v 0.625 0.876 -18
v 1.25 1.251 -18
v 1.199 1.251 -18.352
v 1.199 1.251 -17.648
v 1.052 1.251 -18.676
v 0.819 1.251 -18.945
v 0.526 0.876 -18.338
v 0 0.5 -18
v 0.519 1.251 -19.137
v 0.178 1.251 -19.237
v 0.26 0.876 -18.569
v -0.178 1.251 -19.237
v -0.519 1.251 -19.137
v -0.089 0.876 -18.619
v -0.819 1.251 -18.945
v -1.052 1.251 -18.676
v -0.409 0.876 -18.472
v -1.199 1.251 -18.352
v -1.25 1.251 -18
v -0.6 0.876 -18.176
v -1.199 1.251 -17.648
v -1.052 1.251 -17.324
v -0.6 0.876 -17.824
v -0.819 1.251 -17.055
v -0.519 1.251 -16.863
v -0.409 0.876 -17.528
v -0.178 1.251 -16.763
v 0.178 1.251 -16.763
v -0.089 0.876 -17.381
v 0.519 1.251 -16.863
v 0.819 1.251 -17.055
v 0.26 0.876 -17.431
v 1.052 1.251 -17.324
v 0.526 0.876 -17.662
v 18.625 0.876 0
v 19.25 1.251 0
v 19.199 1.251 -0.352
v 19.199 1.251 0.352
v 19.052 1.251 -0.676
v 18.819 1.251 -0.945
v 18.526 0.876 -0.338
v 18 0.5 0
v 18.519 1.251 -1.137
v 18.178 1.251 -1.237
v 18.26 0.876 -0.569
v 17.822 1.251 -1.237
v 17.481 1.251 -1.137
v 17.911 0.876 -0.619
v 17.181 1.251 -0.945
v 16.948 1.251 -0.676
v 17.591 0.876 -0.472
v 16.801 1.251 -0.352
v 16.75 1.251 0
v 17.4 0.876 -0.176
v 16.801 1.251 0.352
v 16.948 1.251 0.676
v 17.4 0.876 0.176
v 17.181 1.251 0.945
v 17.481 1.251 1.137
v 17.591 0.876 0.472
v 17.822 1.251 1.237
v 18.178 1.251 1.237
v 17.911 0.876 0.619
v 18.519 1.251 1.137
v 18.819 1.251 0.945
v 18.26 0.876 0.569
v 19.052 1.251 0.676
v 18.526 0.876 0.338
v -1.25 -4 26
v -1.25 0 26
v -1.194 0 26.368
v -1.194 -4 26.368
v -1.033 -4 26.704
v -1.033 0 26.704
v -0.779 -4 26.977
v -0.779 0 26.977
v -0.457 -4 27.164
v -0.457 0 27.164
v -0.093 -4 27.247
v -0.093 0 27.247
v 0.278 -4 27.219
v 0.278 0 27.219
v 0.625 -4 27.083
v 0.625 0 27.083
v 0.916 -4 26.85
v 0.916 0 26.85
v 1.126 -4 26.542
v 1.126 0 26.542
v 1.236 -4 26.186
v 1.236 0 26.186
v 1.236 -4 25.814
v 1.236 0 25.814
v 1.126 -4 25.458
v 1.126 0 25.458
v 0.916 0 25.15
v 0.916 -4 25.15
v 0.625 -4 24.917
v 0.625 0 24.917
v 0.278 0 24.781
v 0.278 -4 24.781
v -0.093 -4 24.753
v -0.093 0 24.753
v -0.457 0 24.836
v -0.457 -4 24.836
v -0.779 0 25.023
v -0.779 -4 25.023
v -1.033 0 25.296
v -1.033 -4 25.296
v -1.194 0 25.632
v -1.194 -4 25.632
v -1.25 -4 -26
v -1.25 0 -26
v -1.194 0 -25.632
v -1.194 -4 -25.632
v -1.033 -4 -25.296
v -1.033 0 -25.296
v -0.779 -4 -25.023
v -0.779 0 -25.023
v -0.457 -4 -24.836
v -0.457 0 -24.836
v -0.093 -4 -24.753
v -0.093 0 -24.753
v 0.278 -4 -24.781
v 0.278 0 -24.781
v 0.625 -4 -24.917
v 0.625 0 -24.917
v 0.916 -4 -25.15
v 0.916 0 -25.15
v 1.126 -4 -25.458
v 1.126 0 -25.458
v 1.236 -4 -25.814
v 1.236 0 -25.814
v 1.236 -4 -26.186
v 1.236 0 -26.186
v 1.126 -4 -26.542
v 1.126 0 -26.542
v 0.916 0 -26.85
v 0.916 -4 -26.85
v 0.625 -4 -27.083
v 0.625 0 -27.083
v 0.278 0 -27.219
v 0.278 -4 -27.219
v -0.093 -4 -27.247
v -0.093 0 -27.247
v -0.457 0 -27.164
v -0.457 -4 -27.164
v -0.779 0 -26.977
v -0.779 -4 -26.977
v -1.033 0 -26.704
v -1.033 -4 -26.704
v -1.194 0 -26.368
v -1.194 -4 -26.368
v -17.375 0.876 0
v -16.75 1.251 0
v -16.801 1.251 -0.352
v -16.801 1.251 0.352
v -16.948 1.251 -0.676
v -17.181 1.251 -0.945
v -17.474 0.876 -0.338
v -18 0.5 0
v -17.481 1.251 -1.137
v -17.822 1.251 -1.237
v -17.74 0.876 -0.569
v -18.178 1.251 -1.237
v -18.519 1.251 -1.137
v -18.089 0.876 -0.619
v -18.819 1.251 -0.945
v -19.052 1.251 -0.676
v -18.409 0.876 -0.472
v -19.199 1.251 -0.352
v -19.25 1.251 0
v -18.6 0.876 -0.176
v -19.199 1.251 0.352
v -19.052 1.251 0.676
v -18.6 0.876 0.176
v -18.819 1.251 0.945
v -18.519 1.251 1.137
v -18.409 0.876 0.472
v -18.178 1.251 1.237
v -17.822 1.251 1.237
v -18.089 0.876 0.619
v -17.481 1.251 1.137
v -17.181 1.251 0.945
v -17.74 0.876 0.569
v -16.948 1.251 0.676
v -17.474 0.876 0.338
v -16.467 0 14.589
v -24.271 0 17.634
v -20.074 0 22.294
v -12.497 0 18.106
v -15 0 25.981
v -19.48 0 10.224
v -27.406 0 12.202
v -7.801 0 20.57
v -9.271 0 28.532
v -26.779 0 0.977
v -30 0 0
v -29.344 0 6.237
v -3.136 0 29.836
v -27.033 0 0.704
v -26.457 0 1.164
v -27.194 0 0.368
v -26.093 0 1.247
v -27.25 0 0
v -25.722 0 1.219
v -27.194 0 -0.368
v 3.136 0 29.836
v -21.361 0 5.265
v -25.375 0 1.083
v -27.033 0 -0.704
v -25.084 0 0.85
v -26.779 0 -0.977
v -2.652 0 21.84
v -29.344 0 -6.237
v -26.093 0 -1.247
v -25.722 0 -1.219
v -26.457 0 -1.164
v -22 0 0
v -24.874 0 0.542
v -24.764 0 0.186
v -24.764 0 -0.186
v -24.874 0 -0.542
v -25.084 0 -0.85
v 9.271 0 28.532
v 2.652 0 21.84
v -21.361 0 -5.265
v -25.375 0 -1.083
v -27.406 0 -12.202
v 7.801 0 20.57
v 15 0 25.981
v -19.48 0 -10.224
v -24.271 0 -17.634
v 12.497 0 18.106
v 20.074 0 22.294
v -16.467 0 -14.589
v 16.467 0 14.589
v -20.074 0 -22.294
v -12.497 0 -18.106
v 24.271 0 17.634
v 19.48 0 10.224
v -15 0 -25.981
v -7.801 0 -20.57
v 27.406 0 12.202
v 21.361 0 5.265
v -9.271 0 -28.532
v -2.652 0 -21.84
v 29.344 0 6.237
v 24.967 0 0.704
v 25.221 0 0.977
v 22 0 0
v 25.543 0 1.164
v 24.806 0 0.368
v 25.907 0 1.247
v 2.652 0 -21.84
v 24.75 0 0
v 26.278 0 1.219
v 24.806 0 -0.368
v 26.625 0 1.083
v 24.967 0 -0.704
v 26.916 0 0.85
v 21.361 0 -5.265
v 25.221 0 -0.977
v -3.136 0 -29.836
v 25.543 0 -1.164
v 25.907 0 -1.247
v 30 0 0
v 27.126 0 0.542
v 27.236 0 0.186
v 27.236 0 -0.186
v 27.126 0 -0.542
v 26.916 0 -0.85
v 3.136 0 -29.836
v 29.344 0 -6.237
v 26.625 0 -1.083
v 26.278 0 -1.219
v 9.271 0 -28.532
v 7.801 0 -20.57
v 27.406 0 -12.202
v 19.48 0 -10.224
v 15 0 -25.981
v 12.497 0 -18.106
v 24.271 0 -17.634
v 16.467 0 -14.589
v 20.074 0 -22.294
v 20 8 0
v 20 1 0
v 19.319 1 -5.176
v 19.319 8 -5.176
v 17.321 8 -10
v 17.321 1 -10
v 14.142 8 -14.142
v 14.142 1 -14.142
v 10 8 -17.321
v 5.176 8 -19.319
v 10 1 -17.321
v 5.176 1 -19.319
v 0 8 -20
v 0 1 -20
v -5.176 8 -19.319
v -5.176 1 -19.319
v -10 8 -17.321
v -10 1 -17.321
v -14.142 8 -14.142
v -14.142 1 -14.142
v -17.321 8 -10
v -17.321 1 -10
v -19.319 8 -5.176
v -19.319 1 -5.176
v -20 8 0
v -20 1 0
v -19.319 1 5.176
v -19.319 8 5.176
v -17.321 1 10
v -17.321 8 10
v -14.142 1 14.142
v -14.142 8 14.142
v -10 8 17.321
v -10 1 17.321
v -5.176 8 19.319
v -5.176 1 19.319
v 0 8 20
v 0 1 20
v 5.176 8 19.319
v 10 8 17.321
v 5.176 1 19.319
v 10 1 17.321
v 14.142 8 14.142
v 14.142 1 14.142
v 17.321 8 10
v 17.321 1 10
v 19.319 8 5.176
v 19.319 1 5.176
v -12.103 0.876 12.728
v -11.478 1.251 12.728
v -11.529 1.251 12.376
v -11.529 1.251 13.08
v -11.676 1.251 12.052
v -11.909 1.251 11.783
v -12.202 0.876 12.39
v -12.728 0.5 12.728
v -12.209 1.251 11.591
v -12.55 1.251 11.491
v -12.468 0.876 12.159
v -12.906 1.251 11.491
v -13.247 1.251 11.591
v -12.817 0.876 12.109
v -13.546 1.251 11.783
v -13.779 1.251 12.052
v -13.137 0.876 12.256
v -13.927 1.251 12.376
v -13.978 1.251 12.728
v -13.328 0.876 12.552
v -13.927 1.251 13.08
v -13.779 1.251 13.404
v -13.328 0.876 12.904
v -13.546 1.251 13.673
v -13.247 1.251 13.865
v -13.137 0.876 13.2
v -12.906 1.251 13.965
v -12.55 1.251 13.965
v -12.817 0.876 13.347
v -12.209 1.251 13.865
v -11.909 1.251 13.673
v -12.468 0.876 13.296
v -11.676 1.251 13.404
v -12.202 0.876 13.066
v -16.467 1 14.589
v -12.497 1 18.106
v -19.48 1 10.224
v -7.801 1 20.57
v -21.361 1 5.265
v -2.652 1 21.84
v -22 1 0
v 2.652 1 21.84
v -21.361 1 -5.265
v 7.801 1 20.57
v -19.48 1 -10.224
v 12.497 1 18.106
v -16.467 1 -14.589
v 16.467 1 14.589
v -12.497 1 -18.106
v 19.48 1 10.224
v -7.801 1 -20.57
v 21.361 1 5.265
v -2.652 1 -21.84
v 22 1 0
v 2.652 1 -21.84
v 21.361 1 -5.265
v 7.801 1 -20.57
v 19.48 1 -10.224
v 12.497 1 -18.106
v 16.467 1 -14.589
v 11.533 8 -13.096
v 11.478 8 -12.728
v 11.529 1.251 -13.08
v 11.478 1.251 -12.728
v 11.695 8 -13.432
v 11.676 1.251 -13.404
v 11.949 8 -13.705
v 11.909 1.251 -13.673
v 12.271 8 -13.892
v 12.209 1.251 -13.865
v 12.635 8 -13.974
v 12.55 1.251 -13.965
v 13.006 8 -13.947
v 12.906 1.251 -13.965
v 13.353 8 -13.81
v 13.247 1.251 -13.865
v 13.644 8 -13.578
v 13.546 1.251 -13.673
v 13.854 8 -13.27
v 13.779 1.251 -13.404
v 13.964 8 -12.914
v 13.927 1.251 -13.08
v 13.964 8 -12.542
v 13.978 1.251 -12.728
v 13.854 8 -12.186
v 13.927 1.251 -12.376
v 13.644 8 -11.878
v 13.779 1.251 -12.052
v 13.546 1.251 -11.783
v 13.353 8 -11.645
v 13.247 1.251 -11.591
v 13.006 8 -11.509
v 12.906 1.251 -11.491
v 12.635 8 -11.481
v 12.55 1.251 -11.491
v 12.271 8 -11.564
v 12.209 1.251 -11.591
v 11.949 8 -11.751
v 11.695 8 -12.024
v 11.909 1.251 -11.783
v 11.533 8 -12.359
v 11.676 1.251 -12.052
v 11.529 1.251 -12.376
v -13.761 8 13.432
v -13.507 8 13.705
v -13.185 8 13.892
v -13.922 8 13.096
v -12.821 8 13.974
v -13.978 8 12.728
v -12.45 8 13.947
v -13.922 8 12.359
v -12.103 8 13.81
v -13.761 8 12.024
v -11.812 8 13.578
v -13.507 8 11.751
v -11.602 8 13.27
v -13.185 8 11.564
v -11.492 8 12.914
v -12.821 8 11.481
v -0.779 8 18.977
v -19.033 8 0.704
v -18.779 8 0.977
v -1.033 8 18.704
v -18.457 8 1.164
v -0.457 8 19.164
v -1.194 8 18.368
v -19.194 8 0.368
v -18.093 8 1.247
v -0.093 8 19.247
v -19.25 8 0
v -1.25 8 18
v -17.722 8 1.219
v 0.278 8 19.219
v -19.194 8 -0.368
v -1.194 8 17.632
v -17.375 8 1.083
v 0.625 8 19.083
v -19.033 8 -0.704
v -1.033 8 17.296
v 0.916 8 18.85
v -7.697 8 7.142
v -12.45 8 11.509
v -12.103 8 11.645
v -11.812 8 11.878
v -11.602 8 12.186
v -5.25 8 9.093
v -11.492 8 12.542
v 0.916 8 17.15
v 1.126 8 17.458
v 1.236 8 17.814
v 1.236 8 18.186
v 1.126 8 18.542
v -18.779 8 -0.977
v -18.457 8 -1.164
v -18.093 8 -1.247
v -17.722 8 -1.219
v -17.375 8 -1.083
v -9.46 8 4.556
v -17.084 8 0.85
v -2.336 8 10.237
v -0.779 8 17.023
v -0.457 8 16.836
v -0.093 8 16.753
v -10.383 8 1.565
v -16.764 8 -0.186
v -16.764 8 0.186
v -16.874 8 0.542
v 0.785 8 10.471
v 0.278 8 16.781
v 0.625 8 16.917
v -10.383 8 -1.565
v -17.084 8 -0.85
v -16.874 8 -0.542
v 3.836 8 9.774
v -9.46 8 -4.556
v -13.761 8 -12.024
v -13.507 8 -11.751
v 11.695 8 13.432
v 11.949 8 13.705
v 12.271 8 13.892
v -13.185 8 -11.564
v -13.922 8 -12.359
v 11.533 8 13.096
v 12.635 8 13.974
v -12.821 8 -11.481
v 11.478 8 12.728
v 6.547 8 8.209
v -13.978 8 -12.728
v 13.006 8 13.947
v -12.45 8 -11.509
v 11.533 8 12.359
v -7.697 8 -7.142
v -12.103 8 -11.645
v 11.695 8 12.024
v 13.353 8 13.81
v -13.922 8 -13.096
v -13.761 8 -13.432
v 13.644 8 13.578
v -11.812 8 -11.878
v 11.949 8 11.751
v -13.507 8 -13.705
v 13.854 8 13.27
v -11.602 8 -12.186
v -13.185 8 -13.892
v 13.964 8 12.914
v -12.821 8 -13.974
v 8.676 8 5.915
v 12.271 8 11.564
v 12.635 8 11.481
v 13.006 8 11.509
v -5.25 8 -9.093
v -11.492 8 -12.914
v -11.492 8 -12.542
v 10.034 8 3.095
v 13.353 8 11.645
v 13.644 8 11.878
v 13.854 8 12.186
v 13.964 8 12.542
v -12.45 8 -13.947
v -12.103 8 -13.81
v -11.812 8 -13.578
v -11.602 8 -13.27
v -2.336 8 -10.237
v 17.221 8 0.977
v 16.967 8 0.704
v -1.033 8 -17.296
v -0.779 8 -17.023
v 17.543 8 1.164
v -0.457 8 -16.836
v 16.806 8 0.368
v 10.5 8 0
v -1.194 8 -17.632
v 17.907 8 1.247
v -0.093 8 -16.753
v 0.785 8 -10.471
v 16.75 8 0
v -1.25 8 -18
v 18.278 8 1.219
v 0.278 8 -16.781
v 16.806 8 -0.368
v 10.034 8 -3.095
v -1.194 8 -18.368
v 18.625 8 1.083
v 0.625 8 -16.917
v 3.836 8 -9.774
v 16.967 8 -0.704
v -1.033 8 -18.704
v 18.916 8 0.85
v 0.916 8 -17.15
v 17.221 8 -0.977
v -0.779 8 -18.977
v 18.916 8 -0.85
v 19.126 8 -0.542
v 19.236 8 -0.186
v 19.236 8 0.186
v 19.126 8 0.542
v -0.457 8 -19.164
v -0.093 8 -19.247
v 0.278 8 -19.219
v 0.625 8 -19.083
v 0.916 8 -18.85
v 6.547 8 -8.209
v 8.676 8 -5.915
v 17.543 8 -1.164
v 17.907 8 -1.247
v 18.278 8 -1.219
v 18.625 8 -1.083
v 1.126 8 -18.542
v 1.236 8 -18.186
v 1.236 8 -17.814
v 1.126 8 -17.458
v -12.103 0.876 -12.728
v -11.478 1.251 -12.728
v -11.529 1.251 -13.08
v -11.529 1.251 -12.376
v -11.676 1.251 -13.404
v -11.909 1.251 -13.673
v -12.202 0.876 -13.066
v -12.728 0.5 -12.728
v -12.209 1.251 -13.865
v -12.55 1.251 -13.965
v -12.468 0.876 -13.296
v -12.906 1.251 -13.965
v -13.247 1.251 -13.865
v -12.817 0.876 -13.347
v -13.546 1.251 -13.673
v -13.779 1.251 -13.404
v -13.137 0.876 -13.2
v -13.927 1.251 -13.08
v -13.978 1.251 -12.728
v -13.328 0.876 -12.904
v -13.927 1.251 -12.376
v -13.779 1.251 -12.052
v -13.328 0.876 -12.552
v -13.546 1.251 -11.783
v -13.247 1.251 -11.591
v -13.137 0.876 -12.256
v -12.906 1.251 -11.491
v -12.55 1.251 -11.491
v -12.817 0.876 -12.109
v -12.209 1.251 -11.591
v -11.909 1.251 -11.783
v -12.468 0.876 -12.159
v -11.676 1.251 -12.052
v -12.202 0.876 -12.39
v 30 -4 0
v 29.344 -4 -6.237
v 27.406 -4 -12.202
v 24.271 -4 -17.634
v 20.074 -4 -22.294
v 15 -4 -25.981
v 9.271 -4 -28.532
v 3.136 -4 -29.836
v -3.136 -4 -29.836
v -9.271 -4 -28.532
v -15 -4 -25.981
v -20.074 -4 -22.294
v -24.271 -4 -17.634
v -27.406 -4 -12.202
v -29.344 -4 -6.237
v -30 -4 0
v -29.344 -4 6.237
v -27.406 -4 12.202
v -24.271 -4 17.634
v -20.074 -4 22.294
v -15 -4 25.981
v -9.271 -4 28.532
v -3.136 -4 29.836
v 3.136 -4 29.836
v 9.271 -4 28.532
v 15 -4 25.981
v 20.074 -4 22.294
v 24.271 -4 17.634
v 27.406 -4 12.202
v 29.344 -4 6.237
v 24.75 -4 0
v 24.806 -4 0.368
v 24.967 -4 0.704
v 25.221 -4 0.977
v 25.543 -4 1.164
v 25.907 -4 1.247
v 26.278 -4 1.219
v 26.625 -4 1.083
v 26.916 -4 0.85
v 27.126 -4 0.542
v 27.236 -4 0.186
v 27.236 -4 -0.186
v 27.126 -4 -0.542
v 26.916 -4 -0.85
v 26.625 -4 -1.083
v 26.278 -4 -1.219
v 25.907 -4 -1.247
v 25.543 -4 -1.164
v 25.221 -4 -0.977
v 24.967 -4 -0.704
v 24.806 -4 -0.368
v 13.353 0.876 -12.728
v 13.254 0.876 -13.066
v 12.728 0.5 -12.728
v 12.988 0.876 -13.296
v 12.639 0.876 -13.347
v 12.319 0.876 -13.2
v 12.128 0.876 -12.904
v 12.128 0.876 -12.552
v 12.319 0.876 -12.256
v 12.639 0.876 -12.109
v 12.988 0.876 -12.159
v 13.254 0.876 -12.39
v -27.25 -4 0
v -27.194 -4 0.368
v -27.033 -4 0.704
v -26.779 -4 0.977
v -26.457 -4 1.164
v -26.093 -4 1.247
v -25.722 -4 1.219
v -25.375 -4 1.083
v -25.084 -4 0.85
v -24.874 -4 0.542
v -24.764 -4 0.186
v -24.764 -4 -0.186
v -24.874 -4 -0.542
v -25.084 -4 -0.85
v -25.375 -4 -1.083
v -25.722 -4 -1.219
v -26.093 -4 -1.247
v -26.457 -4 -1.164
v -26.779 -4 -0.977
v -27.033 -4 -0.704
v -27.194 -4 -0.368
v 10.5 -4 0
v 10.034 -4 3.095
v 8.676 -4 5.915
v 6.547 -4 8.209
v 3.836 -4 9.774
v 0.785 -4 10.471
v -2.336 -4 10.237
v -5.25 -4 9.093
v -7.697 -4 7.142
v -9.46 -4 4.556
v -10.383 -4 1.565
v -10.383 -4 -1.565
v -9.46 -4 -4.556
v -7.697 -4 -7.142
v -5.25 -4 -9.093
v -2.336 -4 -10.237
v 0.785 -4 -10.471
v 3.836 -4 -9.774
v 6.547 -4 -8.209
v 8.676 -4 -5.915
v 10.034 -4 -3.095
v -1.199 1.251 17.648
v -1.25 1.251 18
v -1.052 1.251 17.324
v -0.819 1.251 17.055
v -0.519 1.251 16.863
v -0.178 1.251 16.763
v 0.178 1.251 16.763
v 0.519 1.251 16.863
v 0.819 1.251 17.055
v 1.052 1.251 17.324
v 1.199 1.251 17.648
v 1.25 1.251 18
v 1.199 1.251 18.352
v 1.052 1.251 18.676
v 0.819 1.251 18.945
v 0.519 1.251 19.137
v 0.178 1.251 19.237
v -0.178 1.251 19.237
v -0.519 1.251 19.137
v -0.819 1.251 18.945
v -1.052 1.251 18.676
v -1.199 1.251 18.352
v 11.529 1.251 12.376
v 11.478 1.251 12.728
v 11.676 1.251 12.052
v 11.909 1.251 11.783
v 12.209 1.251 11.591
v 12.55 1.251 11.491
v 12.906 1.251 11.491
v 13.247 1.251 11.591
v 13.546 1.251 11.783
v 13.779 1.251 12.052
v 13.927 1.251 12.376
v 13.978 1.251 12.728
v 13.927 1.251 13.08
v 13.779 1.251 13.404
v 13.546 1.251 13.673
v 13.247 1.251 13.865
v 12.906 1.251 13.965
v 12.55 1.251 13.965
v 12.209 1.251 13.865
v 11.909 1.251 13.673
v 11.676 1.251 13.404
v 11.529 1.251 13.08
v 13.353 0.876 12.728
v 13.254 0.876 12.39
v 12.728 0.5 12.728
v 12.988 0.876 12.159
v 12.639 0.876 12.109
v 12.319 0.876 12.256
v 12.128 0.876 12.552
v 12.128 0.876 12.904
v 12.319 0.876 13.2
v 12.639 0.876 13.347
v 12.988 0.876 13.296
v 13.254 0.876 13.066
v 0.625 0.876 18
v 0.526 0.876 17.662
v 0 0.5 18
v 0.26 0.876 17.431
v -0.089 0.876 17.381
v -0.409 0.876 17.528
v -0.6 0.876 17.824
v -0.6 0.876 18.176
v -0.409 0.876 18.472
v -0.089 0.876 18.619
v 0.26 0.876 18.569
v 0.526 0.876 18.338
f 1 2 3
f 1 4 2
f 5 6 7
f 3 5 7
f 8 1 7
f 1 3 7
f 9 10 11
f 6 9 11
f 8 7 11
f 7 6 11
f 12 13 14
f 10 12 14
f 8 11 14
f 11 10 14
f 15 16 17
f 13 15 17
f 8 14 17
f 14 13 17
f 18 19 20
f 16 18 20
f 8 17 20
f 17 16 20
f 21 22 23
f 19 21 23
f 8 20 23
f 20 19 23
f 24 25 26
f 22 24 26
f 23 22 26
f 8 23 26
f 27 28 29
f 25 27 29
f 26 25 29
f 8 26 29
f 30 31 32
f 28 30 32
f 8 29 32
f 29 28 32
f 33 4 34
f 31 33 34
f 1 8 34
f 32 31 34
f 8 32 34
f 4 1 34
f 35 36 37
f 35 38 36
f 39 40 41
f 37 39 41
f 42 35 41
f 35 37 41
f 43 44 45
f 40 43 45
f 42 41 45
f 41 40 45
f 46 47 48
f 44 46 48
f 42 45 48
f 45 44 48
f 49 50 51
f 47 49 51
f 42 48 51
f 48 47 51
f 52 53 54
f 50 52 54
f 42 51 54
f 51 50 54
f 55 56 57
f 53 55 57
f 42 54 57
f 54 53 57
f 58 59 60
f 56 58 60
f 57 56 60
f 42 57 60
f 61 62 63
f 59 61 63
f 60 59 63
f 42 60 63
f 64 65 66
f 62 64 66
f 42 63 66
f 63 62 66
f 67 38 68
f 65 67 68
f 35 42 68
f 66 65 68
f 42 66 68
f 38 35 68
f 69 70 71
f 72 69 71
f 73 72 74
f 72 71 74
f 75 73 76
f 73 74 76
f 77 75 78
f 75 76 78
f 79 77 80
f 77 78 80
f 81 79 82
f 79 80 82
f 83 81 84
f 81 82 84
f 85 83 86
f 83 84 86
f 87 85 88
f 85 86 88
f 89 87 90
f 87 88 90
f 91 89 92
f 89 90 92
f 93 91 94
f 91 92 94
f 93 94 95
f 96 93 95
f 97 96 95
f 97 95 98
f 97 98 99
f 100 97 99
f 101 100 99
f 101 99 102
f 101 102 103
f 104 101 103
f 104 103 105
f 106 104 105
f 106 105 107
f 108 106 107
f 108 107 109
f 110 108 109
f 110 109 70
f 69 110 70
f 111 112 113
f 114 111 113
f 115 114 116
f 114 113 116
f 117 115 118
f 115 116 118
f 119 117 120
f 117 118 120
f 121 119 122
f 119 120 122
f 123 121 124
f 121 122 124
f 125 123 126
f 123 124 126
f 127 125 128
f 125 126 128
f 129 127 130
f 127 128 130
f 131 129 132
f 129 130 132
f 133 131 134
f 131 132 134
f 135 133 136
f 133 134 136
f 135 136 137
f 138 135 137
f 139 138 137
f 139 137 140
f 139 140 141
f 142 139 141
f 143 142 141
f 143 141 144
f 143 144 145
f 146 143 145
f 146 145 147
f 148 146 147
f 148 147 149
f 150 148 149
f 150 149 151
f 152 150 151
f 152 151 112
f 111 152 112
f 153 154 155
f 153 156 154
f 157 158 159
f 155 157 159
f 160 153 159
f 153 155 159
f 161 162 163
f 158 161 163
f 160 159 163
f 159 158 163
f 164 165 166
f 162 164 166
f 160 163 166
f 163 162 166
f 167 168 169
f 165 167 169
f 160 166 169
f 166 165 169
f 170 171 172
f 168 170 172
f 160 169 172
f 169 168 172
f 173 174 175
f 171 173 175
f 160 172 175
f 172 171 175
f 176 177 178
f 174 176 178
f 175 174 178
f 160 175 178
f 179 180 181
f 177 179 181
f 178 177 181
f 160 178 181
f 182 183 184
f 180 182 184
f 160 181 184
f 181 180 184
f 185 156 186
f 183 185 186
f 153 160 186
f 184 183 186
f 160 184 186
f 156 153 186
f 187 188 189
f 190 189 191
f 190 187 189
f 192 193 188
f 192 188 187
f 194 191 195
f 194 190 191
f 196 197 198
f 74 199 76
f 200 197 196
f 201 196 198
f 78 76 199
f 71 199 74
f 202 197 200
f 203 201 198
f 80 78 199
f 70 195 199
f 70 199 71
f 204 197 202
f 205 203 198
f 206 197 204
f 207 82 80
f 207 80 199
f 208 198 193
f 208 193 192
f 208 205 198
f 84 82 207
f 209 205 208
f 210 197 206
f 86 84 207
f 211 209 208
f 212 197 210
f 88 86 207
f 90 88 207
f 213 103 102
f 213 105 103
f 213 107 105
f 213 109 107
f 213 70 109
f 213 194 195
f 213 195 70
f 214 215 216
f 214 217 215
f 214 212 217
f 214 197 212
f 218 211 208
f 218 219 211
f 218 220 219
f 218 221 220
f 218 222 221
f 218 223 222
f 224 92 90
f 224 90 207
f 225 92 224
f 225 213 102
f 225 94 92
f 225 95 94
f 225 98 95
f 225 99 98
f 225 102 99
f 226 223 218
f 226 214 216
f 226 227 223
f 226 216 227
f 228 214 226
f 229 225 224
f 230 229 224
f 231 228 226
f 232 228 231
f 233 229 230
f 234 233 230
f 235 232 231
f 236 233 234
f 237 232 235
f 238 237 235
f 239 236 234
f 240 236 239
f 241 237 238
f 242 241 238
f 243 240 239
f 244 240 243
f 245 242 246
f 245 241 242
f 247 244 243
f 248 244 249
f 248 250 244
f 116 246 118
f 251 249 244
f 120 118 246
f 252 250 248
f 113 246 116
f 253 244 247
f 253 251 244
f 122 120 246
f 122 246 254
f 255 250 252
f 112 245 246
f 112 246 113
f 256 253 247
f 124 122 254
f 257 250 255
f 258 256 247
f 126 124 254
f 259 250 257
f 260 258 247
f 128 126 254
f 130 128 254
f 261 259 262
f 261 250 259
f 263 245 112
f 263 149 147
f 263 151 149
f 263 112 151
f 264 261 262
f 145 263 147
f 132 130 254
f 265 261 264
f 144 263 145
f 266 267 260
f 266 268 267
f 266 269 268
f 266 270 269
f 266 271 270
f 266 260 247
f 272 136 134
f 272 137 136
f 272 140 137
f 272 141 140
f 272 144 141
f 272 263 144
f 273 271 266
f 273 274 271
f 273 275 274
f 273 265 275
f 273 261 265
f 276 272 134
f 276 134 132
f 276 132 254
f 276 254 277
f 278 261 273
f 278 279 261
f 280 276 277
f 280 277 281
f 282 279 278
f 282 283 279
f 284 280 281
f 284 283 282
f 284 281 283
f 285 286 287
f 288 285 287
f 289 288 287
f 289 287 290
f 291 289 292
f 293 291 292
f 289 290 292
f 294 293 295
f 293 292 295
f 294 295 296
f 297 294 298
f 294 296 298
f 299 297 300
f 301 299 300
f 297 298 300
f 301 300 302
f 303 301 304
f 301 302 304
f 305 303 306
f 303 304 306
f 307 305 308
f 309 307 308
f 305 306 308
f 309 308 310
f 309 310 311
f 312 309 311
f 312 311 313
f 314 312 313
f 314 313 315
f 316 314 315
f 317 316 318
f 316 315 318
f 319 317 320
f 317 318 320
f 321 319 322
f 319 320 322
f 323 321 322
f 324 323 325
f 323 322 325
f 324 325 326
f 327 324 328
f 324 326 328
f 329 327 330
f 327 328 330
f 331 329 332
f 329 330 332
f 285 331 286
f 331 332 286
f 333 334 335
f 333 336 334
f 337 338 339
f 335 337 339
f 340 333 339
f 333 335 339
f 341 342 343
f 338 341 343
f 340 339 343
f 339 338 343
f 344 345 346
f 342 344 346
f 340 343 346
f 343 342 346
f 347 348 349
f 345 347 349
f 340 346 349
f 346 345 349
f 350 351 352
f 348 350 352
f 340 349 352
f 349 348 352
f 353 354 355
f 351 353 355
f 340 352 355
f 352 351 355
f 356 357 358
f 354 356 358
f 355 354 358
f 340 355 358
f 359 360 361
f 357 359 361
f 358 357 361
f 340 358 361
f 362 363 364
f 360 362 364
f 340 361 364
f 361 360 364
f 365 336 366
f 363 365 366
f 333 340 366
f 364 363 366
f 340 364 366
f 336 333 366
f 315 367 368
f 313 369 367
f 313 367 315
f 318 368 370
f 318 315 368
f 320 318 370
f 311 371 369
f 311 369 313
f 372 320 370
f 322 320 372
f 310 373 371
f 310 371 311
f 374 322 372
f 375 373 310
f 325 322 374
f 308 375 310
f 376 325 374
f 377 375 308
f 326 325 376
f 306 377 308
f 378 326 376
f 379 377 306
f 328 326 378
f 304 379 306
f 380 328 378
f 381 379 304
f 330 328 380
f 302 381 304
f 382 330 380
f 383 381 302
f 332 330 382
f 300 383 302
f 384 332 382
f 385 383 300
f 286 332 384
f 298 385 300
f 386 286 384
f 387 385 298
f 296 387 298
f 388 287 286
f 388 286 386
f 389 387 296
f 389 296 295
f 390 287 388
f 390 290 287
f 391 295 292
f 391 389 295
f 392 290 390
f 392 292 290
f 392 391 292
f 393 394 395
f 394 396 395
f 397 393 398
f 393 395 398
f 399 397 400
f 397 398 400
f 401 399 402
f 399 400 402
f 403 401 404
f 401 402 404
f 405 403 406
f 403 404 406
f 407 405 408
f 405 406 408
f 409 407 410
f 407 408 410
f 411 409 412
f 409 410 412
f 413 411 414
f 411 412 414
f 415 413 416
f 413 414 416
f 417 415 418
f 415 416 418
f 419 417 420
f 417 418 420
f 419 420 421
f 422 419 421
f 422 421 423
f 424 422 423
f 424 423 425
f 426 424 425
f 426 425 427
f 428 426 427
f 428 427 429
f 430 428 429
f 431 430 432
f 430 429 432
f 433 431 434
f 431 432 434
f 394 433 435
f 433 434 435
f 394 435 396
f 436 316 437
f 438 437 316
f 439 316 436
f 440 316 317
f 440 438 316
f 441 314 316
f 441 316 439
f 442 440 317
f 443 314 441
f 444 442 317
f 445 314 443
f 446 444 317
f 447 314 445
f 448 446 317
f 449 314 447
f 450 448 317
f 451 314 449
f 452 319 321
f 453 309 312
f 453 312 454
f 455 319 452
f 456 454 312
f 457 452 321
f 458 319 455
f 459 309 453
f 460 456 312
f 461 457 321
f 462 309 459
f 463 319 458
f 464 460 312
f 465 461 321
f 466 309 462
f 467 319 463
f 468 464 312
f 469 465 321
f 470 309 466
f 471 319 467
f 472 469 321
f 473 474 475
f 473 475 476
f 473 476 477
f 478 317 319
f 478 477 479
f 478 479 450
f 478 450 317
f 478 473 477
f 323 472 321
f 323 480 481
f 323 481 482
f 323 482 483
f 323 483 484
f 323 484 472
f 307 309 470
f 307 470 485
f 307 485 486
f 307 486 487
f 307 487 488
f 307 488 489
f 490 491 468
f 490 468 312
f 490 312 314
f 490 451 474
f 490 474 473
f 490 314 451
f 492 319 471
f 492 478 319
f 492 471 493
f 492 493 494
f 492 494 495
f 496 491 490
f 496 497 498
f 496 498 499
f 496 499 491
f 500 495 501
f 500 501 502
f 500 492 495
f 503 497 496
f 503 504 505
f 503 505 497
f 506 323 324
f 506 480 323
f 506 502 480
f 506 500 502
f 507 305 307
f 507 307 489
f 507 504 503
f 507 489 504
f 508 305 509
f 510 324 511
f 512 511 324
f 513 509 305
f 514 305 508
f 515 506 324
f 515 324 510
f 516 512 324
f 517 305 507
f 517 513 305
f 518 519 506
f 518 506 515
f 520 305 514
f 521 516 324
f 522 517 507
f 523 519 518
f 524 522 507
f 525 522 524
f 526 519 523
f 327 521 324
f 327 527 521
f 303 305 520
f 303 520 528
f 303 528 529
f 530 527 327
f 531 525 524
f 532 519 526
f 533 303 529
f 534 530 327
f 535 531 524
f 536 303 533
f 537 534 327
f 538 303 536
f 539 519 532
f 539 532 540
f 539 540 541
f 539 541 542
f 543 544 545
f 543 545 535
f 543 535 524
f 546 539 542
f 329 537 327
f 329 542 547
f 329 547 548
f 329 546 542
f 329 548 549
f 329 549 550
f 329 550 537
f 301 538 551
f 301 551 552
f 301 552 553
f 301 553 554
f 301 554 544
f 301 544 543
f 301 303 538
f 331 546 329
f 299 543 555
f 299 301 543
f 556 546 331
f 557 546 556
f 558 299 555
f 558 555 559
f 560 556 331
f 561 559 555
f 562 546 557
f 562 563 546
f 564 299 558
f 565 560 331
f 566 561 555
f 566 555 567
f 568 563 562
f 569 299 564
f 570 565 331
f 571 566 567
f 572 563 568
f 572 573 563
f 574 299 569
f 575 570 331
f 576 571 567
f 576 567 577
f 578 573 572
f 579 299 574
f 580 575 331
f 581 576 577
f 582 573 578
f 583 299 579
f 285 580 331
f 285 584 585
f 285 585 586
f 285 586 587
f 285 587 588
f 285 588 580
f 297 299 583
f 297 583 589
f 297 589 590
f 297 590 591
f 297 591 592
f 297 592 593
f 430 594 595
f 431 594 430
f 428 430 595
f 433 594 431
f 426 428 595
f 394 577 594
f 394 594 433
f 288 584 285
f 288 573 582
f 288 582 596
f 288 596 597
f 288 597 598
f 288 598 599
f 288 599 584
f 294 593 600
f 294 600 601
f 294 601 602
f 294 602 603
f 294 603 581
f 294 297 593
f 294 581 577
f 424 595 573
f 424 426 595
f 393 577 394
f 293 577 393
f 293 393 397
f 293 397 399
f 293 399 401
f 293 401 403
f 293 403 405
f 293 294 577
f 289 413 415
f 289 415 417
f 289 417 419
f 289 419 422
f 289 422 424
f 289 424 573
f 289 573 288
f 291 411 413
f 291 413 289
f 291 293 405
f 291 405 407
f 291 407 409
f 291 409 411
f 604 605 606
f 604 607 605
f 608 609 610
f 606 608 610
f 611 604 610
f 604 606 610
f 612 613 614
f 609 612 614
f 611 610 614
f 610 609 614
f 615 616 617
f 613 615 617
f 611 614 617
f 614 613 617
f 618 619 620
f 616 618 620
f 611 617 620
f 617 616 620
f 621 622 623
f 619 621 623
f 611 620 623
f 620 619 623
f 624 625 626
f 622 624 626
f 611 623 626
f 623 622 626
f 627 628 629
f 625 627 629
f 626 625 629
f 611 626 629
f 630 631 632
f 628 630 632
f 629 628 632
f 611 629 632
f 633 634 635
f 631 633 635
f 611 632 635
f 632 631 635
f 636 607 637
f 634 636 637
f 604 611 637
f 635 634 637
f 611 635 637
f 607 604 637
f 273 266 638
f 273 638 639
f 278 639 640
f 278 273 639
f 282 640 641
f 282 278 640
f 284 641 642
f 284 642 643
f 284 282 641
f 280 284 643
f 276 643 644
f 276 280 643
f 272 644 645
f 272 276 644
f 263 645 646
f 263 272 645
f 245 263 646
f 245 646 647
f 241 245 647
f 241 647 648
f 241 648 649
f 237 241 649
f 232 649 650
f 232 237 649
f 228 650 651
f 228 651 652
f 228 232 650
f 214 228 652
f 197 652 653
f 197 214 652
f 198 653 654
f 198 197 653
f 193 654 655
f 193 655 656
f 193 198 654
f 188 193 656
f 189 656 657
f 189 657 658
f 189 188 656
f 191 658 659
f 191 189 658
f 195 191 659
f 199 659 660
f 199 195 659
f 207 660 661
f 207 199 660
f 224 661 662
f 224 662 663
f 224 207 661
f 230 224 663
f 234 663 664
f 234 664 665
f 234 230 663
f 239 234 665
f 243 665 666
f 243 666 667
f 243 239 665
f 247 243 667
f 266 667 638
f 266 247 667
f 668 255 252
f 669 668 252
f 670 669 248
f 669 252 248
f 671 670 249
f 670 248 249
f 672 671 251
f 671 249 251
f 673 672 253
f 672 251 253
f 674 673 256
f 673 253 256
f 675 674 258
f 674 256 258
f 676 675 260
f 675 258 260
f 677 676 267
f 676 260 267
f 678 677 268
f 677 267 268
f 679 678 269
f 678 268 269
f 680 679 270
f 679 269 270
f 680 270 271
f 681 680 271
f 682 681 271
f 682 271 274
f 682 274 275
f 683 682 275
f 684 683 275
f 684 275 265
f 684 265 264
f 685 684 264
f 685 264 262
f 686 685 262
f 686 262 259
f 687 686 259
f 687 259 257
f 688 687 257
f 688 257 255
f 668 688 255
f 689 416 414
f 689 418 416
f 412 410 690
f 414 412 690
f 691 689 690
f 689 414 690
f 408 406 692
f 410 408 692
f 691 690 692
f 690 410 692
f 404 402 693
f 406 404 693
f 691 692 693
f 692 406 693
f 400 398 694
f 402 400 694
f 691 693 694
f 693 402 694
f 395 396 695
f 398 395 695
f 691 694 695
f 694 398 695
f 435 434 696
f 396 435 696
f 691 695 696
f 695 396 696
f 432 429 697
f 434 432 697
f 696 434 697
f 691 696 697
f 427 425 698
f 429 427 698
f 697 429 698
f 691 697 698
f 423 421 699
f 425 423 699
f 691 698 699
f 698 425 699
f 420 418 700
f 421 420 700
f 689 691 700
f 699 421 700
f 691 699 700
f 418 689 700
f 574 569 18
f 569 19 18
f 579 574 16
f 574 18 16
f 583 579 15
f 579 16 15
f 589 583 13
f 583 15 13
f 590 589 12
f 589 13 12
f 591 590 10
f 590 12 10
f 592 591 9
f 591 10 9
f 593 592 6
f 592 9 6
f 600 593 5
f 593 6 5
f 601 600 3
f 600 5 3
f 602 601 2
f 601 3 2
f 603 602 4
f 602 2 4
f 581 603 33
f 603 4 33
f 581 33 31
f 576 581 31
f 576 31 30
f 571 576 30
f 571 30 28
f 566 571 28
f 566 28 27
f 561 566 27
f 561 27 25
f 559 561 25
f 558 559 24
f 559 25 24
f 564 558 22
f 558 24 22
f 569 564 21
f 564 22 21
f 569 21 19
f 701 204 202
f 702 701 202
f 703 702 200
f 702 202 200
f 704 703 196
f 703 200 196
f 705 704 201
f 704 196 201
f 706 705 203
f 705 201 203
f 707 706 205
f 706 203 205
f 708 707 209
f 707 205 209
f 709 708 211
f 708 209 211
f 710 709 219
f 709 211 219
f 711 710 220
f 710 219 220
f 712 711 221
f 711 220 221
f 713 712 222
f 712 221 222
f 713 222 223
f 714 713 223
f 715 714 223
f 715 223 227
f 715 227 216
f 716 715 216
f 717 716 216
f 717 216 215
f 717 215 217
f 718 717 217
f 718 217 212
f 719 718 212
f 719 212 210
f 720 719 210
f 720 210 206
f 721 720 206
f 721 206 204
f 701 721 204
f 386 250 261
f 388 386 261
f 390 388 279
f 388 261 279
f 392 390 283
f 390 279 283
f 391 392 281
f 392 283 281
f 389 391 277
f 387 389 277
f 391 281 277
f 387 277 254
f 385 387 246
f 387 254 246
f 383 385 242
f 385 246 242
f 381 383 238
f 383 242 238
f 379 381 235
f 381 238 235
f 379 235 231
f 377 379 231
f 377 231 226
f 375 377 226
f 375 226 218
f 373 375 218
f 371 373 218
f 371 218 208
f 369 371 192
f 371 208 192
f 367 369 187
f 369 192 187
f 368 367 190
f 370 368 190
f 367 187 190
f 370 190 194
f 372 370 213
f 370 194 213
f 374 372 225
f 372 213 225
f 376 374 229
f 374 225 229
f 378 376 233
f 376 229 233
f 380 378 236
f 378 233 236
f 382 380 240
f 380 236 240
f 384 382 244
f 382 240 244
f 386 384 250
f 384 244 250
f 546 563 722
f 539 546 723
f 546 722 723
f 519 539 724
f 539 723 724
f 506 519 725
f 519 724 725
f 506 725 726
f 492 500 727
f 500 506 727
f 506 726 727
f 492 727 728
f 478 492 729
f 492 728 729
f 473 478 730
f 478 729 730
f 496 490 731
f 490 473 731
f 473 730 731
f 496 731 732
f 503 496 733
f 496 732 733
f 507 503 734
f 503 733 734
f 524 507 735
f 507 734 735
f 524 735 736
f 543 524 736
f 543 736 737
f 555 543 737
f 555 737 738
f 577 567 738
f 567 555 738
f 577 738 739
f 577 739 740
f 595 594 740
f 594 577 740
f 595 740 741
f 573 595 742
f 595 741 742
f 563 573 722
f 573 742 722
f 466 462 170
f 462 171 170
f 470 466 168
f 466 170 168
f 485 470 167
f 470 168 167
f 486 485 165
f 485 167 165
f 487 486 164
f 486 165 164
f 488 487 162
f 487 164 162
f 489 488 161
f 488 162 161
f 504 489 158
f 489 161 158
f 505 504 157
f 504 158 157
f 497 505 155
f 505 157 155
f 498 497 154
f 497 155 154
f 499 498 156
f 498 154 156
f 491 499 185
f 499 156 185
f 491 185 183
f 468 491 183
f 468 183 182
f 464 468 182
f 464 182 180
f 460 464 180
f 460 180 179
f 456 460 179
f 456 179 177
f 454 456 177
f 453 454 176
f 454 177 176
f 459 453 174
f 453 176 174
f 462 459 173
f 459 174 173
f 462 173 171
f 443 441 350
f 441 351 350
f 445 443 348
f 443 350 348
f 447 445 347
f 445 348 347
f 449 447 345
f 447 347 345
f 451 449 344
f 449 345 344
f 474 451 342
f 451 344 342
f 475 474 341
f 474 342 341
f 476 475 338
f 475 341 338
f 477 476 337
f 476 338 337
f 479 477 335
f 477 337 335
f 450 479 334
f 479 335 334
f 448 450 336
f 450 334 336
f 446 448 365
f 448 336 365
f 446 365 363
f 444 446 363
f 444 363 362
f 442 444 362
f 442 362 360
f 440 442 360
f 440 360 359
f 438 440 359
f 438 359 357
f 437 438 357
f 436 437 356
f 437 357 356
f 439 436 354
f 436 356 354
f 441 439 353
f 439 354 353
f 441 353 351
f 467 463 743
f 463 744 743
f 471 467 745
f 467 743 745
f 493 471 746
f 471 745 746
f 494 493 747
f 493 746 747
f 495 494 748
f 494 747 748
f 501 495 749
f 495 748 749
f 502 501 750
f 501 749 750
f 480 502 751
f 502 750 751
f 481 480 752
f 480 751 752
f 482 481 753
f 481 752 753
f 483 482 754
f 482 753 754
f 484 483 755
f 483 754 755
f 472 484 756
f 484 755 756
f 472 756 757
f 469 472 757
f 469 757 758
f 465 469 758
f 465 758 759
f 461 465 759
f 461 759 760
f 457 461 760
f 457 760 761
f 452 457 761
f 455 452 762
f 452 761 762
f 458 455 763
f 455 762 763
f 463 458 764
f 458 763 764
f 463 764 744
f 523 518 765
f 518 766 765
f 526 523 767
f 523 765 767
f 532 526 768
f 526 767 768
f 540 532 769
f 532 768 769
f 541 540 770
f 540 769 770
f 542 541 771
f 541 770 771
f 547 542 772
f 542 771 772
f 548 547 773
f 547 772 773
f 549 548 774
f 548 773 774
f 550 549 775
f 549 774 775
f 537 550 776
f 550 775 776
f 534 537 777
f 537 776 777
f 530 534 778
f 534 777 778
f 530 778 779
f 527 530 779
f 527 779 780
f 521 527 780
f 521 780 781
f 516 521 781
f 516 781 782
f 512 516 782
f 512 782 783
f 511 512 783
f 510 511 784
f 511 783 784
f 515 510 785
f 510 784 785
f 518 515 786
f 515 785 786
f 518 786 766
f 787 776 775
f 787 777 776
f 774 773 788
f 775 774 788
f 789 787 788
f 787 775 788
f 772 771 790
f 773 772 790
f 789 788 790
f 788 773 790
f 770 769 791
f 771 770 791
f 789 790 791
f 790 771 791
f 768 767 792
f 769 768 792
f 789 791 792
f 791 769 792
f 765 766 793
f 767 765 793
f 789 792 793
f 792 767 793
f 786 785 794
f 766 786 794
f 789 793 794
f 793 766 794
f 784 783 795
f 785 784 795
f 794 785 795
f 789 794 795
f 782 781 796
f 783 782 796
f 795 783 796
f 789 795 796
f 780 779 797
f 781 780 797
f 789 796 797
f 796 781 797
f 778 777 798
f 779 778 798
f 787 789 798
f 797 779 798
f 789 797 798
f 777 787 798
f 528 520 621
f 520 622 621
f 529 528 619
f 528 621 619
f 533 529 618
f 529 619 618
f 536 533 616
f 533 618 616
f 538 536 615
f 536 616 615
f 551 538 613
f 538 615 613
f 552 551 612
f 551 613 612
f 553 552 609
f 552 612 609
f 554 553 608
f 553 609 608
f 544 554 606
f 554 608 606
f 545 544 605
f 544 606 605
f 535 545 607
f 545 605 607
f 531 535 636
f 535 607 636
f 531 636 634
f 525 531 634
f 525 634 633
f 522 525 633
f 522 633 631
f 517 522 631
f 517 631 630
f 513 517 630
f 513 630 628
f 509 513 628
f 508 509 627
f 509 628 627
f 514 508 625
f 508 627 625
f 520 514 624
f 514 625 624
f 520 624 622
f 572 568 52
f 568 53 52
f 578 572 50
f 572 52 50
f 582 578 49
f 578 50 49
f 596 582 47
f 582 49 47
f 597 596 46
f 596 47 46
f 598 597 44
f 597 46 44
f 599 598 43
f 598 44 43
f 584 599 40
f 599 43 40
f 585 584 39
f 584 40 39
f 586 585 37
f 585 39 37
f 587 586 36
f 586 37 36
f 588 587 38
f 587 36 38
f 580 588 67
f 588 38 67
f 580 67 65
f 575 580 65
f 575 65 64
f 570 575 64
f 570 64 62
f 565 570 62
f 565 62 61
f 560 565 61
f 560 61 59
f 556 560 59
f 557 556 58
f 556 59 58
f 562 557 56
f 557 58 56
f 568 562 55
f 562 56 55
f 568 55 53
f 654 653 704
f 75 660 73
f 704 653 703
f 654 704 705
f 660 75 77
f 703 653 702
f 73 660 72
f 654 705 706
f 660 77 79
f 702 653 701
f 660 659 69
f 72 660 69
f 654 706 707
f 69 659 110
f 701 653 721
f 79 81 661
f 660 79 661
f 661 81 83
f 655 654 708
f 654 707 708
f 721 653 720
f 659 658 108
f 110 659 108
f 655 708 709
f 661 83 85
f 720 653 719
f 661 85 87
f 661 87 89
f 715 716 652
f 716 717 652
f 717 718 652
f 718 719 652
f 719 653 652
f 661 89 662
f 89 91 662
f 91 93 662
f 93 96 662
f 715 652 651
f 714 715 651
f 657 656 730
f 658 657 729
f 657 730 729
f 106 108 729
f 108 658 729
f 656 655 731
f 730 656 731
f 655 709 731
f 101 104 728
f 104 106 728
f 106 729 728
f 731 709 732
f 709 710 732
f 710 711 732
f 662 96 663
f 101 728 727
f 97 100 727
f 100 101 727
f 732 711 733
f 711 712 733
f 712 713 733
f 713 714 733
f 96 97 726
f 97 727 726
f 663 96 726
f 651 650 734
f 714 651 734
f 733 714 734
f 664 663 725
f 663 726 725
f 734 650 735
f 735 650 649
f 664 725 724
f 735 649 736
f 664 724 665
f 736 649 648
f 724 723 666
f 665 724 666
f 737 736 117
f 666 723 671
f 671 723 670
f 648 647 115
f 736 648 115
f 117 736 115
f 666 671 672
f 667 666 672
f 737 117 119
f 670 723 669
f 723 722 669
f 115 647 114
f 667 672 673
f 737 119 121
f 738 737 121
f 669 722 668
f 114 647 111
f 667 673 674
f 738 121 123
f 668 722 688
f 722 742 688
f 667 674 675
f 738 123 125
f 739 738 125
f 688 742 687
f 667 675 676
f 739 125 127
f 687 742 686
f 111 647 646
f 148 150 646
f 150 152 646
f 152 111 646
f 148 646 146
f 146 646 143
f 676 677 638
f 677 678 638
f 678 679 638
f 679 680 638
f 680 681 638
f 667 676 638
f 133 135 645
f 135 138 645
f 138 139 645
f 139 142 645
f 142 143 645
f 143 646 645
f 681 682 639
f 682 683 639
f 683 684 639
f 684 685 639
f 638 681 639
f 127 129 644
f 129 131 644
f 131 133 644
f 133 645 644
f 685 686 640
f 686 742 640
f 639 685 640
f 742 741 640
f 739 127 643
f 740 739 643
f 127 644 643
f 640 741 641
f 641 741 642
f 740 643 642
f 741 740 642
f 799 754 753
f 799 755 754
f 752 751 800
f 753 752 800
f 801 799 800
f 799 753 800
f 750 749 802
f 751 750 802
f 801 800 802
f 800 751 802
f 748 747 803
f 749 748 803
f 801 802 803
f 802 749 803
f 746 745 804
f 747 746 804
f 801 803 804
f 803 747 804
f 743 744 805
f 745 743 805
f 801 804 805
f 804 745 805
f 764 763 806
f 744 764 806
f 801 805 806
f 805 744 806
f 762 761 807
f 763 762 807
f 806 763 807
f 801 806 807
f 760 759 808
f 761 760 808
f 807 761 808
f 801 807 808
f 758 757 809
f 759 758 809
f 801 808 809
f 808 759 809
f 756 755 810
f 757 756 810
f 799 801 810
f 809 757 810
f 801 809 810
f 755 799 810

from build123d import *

# Parameters (mm, degrees)
SKETCH1_R             = 30
BASE_CORE_DEPTH       = 4
SKETCH2_R             = 22
CLEARNESS_DEPTH       = 1
SKETCH3_R             = 20
BREAING_40_ID_DEPTH   = 7
SKETCH4_R             = 10.5
BREAING_21_OD_DEPTH   = 5
SKETCH5_R             = 10.5
MOTOR_CUT_DEPTH       = 7
M3_TAPPED_HOLE2_D     = 2.5
M3_TAPPED_HOLE2_DEPTH = 6.748924226
M3_TAPPED_HOLE2_TIP   = 0.751075774
M3_TAPPED_HOLE1_D     = 2.5


with BuildPart() as part:
    # Sketch1 → base-core (new body)
    with BuildSketch(Plane(origin=(0, 0, 0), x_dir=(1, 0, 0), z_dir=(0, 1, 0))):
        Circle(SKETCH1_R)
    extrude(amount=-BASE_CORE_DEPTH)

    # Sketch2 → clearness (add)
    with BuildSketch(Plane(origin=(0, 0, 0), x_dir=(1, 0, 0), z_dir=(0, 1, 0))):
        Circle(SKETCH2_R)
    extrude(amount=CLEARNESS_DEPTH)

    # Sketch3 → breaing-40-ID (add)
    with BuildSketch(Plane(origin=(0, 1, 0), x_dir=(1, 0, 0), z_dir=(0, 1, 0))):
        Circle(SKETCH3_R)
    extrude(amount=BREAING_40_ID_DEPTH)

    # Sketch4 → breaing-21-OD (cut)
    with BuildSketch(Plane(origin=(0, 8, 0), x_dir=(1, 0, 0), z_dir=(0, 1, 0))):
        Circle(SKETCH4_R)
    extrude(amount=-BREAING_21_OD_DEPTH, mode=Mode.SUBTRACT)

    # Sketch5 → motor-cut (cut)
    with BuildSketch(Plane.XZ.offset(4)):
        Circle(SKETCH5_R)
    extrude(amount=-MOTOR_CUT_DEPTH, mode=Mode.SUBTRACT)

    # M3 Tapped Hole2
    with Locations(Plane(origin=(0, 8, 0), x_dir=(1, 0, 0), z_dir=(0, 1, 0))):
        with Locations((12.727922061, 12.727922061), (18, 0), (12.727922061, -12.727922061), (0, -18), (-12.727922061, -12.727922061), (-18, 0), (-12.727922061, 12.727922061), (0, 18), (0, 0)):
            Hole(M3_TAPPED_HOLE2_D / 2, depth=M3_TAPPED_HOLE2_DEPTH)
            with Locations((0, 0, -(M3_TAPPED_HOLE2_DEPTH + M3_TAPPED_HOLE2_TIP / 2))):  # 118° drill point
                Cone(0, M3_TAPPED_HOLE2_D / 2, M3_TAPPED_HOLE2_TIP, mode=Mode.SUBTRACT)

    # M3 Tapped Hole1 (through all)
    with Locations(Plane.XZ.offset(4)):
        with Locations((-26, 0), (0, 26), (26, 0), (0, -26)):
            Hole(M3_TAPPED_HOLE1_D / 2)


solid = part.part
